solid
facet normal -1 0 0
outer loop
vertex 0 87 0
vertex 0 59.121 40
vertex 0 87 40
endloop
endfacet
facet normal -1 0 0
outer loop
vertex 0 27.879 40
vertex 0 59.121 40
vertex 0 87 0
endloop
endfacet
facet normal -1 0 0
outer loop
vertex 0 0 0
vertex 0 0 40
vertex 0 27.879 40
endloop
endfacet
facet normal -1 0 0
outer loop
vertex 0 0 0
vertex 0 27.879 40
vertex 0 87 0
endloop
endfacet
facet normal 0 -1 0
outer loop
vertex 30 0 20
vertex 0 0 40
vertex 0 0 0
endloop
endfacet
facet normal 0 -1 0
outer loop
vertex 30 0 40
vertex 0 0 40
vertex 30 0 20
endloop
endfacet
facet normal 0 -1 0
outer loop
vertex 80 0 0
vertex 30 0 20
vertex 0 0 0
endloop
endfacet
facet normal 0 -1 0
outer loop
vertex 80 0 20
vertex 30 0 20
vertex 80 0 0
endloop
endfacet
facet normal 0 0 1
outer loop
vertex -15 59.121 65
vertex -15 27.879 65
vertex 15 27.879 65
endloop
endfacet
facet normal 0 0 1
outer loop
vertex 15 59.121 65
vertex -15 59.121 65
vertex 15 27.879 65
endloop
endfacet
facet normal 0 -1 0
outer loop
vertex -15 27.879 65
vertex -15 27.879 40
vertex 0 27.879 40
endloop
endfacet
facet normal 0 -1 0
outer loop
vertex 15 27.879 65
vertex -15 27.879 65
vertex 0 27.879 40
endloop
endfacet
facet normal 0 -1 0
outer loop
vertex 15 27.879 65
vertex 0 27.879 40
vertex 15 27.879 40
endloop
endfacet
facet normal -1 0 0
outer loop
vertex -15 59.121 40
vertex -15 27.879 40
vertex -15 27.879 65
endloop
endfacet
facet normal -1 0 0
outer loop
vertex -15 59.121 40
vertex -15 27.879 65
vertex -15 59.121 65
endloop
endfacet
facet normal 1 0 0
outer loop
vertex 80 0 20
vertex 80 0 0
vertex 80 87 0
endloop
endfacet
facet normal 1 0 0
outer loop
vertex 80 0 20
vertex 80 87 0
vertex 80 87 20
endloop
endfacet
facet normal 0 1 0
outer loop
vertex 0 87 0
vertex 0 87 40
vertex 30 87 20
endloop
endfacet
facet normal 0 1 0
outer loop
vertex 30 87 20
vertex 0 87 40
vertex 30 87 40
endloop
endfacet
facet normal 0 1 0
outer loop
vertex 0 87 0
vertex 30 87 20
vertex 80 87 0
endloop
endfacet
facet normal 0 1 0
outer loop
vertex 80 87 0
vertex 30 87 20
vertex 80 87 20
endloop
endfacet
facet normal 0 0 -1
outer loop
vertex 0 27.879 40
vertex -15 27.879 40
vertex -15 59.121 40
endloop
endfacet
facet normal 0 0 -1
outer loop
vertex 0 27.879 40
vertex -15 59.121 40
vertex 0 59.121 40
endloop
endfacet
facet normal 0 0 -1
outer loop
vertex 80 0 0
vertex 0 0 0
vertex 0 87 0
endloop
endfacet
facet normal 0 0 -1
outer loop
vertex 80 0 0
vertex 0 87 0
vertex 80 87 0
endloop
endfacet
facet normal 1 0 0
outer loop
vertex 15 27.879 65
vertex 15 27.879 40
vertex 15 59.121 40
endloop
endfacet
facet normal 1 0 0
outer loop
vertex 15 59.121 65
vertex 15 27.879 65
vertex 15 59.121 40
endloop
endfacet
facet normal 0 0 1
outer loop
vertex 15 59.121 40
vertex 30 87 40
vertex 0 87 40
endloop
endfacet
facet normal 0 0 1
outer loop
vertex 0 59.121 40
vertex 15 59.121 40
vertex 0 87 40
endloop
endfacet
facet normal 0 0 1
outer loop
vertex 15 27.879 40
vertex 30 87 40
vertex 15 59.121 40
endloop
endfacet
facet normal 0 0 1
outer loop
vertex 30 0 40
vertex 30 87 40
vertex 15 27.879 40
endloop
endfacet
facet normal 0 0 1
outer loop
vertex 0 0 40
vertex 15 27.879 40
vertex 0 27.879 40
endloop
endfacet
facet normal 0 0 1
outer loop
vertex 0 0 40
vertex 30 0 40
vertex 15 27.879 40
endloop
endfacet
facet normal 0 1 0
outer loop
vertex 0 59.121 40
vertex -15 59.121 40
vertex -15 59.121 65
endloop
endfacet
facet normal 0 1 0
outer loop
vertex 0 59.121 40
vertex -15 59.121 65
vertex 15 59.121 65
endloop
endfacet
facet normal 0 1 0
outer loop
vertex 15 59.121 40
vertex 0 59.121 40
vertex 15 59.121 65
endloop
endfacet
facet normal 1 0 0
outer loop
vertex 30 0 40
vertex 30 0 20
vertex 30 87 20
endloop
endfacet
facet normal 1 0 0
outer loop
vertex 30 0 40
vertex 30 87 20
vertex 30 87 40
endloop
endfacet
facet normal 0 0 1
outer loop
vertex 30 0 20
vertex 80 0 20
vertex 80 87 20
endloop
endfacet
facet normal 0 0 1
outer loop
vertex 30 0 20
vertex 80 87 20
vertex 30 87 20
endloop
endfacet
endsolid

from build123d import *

# Parameters (mm, degrees)
F1_DEPTH = 87
F3_W     = 30
F3_H     = 31.242104
F4_DEPTH = 25


with BuildPart() as f1:
    # F0 (on Front) → F1 (new body)
    with BuildSketch(Plane.XZ):
        Polygon((30, 40), (0, 40), (0, 0), (80, 0), (80, 20), (30, 20), align=None)
    extrude(amount=-F1_DEPTH)

    # F3 (on face) → F4 (join)
    with BuildSketch(Plane.XY.offset(40)):
        with Locations((0, 43.5)):
            Rectangle(F3_W, F3_H)
    extrude(amount=F4_DEPTH)


solid = f1.part
